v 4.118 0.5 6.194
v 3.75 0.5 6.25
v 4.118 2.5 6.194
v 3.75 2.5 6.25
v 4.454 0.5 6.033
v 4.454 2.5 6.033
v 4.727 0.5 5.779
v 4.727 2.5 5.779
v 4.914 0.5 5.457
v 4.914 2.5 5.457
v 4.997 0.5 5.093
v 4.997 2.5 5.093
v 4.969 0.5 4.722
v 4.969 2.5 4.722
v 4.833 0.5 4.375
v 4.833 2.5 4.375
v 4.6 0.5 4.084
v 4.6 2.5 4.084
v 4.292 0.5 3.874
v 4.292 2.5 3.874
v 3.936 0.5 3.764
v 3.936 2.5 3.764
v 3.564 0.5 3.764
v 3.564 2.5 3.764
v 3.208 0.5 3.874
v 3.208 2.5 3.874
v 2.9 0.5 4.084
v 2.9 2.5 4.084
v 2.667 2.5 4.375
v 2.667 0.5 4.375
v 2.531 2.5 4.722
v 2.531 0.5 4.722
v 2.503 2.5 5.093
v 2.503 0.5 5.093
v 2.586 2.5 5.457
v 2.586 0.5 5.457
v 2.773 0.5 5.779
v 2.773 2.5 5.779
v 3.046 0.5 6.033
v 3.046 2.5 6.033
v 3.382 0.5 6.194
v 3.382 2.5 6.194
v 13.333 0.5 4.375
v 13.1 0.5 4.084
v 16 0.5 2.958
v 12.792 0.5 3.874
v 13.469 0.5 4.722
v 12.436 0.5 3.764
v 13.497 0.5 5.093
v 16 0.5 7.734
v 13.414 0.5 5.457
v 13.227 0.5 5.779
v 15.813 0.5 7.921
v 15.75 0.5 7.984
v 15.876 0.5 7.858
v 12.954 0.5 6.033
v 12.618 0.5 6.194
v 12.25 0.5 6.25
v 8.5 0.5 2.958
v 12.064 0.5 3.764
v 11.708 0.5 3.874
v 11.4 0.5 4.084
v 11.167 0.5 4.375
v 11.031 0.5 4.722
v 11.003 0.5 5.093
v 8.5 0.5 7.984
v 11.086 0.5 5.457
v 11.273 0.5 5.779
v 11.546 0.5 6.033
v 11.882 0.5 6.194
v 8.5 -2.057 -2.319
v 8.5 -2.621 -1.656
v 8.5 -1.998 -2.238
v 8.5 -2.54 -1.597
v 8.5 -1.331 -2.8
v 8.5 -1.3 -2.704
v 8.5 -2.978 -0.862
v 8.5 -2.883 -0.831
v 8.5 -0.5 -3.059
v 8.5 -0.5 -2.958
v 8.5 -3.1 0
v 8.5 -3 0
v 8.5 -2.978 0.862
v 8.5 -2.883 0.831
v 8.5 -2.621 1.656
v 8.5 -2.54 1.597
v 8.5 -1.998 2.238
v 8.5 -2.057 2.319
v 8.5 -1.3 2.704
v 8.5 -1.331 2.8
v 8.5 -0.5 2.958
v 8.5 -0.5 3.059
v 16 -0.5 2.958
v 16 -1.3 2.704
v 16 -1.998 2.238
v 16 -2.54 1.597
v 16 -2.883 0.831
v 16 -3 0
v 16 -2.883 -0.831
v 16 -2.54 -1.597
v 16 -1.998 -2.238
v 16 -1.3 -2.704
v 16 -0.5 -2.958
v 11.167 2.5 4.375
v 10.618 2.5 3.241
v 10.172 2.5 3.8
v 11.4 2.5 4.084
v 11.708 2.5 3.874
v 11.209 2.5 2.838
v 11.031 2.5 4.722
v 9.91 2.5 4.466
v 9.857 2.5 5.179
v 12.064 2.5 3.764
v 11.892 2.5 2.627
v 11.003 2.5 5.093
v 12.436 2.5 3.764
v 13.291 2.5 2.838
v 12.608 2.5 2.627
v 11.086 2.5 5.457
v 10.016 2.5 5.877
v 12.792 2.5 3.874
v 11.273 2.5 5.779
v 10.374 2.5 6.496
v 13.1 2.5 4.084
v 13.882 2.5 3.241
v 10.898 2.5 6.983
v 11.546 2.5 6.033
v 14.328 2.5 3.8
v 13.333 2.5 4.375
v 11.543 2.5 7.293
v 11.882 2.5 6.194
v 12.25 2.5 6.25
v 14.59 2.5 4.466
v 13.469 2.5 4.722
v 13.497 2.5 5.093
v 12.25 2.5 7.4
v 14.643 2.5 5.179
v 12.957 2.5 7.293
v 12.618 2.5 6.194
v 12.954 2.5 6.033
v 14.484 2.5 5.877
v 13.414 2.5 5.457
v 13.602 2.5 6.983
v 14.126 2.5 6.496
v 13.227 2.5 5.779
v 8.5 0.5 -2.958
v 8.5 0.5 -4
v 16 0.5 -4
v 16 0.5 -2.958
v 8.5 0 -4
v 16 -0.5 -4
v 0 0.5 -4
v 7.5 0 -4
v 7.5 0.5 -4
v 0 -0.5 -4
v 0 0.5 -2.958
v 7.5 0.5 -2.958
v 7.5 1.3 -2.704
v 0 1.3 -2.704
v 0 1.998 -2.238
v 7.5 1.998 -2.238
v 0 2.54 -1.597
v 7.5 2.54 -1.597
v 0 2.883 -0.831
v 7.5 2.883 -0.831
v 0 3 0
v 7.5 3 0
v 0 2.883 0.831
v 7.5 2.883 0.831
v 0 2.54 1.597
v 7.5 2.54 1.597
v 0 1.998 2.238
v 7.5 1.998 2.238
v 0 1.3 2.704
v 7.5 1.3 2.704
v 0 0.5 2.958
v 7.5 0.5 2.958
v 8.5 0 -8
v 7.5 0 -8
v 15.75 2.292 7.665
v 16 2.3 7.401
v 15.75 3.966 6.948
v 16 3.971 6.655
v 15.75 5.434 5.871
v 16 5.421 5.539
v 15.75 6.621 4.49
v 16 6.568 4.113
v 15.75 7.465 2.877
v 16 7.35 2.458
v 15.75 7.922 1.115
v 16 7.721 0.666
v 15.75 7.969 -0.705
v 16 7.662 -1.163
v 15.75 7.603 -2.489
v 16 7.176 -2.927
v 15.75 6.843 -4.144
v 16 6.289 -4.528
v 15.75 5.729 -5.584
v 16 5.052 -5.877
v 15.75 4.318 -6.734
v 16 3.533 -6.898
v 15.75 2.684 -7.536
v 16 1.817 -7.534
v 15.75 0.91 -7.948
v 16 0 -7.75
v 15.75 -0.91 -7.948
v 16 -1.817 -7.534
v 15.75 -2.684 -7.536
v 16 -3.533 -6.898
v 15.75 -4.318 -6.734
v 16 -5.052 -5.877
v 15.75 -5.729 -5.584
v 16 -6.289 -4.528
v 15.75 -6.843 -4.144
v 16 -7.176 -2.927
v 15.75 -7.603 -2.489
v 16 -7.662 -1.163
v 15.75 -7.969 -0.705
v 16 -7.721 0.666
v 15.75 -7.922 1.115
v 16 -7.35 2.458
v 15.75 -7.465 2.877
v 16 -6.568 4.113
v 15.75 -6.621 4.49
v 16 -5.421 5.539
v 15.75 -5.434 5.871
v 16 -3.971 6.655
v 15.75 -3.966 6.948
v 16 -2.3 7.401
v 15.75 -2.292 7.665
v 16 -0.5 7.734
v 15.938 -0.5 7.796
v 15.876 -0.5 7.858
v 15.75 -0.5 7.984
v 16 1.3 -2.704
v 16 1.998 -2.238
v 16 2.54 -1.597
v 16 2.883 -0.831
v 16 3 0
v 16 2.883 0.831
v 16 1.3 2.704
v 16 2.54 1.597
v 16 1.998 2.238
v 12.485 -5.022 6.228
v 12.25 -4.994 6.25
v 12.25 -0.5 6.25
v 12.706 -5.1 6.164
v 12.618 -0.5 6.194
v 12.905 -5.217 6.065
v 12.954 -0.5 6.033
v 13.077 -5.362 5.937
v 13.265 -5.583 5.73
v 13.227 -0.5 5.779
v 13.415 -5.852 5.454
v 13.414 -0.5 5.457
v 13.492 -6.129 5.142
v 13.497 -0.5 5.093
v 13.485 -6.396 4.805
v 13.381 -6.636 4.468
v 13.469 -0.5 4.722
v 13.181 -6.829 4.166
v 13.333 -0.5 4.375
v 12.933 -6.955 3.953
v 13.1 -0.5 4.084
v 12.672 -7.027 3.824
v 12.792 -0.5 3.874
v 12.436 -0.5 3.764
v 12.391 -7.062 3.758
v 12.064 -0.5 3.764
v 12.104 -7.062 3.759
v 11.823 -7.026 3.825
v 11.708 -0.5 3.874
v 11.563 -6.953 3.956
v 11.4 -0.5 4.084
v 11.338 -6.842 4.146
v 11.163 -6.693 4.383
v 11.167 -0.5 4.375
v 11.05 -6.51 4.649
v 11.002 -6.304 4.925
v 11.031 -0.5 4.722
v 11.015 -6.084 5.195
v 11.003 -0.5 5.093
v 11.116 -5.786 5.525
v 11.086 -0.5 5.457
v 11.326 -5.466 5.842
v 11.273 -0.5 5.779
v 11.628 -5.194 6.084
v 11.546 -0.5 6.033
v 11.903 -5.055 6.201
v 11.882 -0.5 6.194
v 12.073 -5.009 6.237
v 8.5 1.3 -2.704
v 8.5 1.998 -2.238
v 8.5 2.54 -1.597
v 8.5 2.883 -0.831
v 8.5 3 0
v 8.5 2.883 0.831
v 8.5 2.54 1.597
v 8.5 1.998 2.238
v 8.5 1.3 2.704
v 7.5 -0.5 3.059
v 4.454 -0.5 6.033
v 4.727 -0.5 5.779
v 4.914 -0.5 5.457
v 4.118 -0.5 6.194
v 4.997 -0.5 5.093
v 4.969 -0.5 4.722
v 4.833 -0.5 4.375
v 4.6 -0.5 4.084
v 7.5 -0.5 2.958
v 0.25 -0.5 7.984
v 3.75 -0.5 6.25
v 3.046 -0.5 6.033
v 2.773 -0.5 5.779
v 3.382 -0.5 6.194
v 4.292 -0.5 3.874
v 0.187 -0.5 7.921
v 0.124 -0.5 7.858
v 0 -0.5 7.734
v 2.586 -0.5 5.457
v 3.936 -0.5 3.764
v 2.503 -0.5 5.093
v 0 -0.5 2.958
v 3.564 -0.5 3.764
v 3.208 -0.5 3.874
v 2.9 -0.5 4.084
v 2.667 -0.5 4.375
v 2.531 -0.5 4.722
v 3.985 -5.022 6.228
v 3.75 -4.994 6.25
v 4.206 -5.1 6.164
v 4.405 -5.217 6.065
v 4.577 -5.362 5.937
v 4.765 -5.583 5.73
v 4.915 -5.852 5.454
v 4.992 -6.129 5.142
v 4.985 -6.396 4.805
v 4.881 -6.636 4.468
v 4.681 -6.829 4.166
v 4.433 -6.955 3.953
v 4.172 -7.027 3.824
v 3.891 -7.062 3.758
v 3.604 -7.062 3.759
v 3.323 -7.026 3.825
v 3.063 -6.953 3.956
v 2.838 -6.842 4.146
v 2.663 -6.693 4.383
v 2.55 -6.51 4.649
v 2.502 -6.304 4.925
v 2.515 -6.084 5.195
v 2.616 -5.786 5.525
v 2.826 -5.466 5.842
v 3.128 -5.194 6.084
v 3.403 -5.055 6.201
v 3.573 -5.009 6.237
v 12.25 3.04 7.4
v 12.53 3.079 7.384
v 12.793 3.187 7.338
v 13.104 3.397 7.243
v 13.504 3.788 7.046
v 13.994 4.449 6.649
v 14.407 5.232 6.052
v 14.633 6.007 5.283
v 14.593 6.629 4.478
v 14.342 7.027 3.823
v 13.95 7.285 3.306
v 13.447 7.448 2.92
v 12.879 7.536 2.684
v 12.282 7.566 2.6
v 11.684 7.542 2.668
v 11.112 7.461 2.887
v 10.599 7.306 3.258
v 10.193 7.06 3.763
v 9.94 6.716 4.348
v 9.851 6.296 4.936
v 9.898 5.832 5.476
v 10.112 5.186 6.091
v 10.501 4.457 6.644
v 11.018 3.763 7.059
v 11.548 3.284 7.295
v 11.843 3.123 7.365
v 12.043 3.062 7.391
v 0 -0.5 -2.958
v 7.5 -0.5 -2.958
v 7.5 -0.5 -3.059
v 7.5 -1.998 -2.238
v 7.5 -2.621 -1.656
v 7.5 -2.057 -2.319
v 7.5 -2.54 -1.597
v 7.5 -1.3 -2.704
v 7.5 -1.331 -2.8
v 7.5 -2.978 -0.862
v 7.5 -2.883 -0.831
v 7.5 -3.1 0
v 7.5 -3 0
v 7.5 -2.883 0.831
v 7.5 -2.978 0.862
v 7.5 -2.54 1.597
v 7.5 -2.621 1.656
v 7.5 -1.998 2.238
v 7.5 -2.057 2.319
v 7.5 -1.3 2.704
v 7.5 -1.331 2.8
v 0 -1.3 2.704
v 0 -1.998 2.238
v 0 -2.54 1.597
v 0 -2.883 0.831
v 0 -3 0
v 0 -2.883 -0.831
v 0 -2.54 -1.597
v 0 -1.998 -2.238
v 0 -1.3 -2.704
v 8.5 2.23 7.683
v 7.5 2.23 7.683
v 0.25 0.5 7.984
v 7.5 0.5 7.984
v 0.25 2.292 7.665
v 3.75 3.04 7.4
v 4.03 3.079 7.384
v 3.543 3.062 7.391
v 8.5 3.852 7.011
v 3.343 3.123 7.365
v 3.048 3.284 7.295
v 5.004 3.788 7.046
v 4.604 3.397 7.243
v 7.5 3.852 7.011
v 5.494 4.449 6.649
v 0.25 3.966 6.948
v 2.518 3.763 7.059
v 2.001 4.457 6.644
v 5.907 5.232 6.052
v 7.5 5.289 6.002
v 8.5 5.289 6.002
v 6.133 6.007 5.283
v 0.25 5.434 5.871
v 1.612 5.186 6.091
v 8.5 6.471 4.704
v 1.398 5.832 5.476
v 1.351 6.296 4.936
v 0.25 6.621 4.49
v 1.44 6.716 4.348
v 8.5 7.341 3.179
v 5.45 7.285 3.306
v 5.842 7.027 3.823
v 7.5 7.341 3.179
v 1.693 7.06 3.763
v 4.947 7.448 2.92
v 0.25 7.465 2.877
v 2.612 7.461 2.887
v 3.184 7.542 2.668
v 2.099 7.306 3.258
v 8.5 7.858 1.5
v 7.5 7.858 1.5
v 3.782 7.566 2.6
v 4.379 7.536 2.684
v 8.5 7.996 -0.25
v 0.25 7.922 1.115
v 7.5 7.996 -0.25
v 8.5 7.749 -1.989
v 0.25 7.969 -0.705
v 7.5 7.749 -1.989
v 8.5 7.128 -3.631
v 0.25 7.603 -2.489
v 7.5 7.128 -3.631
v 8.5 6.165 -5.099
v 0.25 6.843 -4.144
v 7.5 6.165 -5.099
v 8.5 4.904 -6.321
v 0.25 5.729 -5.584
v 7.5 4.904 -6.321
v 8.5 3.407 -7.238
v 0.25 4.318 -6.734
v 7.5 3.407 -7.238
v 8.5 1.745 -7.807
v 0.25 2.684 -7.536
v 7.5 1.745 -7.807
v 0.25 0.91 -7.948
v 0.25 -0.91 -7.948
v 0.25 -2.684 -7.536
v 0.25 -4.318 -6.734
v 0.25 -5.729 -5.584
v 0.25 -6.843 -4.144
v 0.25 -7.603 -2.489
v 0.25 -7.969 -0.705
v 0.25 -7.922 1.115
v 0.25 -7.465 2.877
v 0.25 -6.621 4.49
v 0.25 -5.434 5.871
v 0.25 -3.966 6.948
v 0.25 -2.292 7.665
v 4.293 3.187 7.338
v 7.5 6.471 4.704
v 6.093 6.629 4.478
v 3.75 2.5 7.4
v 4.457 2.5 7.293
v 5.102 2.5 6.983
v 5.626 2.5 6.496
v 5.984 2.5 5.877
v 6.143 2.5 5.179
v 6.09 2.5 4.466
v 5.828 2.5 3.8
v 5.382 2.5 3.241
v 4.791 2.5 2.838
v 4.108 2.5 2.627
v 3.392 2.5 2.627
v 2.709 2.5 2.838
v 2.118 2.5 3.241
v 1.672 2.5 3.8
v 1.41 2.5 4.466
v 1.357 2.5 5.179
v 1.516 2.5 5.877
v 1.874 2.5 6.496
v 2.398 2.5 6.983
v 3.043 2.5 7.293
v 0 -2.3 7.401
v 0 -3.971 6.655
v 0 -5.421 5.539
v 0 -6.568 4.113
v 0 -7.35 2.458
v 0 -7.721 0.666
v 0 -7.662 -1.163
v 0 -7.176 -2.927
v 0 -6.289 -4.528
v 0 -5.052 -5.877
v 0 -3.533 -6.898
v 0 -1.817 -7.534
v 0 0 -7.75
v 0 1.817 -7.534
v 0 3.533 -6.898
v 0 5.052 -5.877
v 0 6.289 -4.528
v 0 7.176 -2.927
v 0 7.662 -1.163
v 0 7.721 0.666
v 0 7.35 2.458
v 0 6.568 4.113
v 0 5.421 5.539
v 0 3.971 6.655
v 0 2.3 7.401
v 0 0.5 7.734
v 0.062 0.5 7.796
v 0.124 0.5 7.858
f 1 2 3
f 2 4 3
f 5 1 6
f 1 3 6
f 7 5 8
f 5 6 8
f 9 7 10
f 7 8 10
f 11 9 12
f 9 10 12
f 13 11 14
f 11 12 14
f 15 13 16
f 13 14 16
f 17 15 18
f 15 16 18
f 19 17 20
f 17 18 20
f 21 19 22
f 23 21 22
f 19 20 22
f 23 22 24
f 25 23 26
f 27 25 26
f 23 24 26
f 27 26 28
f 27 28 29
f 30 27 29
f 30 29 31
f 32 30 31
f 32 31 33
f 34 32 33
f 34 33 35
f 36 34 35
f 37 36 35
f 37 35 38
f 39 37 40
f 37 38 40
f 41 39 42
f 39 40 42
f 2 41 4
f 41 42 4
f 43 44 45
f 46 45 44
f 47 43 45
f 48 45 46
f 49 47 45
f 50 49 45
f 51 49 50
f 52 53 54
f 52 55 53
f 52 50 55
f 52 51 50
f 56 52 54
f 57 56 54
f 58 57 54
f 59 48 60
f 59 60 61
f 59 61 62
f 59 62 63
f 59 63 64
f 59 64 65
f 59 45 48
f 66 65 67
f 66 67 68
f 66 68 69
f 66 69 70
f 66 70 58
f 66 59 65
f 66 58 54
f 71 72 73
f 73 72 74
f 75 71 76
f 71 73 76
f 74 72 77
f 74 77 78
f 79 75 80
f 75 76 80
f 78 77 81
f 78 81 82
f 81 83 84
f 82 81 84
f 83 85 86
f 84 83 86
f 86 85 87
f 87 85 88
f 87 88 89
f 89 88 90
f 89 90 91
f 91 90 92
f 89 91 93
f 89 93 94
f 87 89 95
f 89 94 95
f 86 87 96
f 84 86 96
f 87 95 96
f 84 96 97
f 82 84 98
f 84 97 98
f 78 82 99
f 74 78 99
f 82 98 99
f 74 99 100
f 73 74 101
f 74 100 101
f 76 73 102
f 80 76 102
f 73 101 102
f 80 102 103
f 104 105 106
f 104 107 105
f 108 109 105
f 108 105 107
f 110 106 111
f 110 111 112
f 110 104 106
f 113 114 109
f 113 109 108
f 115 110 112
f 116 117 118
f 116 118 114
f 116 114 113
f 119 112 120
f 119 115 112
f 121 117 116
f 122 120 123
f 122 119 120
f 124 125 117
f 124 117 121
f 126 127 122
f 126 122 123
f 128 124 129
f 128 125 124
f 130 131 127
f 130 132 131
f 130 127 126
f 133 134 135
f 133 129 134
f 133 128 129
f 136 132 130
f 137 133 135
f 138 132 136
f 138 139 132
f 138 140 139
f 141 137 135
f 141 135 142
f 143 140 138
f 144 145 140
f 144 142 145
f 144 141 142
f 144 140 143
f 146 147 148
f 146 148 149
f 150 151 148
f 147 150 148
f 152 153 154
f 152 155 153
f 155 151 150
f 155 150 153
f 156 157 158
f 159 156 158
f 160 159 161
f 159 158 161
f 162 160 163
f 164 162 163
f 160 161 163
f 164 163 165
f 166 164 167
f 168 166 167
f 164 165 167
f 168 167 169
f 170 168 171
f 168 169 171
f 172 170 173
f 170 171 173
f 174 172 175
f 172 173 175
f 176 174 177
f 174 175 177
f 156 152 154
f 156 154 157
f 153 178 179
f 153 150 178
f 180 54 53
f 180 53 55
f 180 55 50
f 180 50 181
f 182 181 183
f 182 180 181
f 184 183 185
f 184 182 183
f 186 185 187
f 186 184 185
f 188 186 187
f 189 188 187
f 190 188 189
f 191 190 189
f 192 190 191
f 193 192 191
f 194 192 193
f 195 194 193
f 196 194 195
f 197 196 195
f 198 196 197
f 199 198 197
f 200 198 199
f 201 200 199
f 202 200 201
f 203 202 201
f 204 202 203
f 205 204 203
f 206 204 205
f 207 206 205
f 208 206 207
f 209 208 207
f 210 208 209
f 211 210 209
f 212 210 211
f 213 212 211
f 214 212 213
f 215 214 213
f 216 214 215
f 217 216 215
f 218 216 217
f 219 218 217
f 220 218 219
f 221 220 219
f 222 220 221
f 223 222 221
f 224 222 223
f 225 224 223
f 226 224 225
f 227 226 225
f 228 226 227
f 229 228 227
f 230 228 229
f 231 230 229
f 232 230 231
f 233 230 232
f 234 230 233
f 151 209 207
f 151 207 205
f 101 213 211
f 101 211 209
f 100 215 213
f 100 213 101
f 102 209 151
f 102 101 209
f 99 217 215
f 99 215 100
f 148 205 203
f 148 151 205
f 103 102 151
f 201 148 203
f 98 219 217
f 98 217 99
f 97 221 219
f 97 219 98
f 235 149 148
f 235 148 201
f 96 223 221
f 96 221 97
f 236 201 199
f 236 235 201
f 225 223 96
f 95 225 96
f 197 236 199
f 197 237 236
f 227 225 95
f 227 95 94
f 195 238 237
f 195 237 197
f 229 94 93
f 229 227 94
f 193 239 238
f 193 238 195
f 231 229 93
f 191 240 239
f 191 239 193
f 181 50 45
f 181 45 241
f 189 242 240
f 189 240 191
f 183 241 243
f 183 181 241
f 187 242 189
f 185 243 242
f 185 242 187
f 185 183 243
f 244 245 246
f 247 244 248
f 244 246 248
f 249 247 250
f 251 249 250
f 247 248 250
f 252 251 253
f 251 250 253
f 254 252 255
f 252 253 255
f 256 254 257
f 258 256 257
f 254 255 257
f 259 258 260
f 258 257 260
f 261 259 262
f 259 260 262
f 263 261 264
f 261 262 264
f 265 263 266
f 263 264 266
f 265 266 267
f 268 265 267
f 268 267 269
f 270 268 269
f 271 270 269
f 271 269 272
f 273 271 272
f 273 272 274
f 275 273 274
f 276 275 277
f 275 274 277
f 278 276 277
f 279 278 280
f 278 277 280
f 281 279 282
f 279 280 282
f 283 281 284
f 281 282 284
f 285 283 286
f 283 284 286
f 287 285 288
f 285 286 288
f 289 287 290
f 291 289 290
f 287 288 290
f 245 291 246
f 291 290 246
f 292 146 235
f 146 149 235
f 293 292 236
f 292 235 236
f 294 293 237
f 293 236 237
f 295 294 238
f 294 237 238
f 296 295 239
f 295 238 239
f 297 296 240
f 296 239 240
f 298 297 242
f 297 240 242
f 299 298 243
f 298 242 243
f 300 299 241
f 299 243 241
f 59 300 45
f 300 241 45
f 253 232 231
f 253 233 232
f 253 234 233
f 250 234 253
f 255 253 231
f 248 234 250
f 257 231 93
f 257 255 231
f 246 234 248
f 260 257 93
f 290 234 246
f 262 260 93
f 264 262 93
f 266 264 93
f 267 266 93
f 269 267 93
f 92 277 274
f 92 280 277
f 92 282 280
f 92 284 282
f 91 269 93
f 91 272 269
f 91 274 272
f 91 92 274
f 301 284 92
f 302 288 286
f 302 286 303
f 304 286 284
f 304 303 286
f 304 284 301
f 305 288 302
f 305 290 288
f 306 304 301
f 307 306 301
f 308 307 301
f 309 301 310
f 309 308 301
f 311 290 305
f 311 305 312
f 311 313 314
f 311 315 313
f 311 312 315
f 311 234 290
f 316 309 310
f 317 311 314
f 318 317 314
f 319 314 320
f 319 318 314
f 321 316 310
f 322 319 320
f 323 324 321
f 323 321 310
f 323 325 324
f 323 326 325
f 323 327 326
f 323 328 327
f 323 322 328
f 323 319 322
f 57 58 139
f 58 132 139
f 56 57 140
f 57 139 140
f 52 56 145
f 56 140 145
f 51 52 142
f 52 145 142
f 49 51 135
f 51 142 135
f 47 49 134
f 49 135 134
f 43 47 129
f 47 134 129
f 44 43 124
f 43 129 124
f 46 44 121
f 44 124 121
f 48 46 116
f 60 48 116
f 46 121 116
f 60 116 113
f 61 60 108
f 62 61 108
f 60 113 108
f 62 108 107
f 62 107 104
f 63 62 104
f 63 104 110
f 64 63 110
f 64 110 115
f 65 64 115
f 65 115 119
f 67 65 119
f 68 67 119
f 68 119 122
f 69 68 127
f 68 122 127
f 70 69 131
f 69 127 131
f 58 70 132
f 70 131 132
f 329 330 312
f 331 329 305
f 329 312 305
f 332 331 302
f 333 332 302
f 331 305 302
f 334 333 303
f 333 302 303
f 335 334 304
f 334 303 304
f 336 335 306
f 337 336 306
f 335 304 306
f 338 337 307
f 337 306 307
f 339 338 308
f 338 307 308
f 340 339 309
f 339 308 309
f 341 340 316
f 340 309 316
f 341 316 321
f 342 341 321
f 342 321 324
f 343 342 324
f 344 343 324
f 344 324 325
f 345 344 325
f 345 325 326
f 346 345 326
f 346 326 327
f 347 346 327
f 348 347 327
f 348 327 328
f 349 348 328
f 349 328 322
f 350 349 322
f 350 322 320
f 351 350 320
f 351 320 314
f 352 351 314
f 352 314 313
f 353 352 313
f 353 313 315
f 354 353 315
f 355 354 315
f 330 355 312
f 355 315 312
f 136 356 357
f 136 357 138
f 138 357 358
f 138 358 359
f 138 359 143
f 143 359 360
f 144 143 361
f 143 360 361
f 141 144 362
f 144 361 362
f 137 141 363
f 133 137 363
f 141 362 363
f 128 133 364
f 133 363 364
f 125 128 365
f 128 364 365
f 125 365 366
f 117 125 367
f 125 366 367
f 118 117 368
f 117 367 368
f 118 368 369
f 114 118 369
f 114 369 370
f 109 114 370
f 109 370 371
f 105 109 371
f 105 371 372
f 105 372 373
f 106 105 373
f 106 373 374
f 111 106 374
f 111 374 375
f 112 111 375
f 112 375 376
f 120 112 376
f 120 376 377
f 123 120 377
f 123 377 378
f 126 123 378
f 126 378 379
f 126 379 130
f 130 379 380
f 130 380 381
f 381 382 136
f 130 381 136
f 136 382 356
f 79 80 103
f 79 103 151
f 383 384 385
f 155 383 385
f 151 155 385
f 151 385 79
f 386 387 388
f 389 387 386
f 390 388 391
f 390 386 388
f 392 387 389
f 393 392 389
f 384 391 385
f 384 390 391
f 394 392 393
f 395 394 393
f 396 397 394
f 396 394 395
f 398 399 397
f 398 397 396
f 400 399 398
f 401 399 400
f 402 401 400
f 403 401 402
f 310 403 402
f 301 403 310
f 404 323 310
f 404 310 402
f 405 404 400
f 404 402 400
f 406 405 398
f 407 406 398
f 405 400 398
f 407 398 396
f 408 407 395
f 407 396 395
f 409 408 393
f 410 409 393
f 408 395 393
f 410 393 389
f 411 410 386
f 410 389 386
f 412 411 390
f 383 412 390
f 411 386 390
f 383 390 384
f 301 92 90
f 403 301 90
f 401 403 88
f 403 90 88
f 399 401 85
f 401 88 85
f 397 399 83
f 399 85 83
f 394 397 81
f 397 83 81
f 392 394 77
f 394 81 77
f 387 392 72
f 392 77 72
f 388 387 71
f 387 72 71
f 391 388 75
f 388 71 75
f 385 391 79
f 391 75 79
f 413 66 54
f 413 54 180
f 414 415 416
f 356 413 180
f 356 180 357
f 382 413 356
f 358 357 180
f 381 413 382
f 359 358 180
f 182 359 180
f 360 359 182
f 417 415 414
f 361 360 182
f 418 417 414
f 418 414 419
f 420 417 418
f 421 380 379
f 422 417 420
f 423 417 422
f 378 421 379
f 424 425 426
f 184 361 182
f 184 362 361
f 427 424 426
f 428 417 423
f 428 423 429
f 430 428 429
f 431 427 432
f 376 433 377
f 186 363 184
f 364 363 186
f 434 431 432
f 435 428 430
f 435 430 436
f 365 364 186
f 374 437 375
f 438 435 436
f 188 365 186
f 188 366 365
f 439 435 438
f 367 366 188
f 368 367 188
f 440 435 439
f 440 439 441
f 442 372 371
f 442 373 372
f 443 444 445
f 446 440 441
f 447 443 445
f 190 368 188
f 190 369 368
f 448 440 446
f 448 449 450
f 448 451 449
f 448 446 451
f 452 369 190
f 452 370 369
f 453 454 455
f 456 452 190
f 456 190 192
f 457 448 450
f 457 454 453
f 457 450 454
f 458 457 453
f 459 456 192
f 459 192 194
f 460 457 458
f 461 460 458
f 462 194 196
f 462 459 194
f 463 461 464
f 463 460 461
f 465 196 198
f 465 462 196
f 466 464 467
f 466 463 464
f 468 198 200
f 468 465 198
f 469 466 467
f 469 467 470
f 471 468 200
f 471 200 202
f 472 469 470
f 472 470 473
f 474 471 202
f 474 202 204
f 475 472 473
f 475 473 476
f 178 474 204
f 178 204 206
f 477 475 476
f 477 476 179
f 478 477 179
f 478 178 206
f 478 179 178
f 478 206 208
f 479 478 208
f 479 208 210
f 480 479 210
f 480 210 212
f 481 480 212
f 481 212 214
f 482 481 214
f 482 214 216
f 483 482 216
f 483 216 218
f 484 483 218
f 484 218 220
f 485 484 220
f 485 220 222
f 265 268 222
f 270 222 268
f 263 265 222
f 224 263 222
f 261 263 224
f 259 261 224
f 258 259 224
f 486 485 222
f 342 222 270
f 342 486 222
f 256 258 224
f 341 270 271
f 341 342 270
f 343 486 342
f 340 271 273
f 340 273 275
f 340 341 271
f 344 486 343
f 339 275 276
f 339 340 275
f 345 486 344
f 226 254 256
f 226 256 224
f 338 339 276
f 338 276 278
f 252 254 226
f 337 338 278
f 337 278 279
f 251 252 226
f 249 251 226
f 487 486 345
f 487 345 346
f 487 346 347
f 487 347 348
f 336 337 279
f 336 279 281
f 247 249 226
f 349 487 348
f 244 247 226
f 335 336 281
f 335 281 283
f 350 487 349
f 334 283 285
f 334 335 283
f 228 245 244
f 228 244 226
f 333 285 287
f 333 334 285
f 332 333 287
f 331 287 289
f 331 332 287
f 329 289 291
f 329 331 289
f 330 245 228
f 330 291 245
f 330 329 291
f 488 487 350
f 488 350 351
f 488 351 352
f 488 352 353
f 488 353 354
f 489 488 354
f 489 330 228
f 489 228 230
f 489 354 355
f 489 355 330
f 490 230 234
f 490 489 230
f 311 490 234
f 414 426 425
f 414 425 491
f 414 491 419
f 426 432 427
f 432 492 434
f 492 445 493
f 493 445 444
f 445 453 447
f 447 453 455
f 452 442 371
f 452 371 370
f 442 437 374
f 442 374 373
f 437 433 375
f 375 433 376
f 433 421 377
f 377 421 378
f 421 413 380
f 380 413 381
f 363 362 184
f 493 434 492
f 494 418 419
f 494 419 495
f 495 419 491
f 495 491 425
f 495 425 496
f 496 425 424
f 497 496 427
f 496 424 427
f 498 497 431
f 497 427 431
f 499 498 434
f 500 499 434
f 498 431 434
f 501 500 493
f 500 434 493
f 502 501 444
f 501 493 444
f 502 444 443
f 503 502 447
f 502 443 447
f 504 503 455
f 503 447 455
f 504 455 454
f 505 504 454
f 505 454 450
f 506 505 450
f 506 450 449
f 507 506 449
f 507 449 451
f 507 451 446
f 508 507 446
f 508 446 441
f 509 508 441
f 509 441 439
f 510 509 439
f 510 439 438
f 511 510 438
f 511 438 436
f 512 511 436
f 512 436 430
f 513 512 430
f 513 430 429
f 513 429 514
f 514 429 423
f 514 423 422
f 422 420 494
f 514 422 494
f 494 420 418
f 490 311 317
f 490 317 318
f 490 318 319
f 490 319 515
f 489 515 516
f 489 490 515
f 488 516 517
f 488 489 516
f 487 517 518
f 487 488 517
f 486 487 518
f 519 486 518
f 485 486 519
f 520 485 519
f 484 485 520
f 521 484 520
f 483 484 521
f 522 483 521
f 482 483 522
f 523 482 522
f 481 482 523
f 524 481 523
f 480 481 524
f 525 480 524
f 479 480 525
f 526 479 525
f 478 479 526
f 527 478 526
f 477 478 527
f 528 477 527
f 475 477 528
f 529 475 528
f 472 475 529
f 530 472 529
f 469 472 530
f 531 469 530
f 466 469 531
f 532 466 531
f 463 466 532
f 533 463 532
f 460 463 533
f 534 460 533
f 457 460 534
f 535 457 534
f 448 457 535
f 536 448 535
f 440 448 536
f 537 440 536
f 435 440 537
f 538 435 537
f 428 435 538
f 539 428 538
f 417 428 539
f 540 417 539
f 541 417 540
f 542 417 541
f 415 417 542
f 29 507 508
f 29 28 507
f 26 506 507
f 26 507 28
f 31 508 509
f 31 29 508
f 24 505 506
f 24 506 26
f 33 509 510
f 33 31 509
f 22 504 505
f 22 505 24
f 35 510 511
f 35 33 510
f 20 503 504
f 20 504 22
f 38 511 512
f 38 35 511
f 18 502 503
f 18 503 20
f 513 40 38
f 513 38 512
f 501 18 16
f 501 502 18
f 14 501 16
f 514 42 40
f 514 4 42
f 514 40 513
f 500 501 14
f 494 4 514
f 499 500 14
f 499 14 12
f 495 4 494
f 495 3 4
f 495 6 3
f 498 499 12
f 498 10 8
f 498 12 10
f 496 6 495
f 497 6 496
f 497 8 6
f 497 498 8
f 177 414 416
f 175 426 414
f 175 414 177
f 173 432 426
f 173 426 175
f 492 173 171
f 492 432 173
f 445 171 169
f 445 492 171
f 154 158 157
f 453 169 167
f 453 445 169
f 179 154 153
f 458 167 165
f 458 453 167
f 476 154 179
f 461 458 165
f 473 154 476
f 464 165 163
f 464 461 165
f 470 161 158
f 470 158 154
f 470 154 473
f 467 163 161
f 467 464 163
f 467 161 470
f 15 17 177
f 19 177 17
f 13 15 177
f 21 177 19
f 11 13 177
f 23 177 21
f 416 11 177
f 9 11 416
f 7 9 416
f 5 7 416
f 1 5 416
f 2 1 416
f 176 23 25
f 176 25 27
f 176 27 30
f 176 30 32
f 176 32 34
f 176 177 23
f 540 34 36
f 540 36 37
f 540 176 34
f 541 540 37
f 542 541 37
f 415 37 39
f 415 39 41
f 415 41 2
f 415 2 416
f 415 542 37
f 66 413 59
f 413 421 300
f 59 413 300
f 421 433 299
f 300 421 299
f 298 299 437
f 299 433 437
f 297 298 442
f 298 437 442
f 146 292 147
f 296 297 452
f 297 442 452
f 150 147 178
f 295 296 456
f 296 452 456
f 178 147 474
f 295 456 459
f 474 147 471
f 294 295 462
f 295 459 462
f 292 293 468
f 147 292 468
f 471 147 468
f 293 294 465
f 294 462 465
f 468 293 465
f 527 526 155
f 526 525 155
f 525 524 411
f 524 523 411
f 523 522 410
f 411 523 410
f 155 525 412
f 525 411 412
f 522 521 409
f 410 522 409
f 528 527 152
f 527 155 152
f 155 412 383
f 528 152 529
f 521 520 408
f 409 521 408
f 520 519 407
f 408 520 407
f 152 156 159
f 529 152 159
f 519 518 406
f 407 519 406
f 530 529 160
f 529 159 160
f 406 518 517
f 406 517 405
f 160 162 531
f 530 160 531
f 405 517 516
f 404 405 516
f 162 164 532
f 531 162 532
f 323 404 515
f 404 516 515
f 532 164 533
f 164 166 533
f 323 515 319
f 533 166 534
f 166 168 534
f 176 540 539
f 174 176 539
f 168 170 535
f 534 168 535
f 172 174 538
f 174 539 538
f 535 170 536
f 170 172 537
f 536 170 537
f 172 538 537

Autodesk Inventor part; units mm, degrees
sketch "Sketch_1" plane through (0, 0, 0) normal (0, 0, 1) x (1, 0, 0)
  line L0 (16, 0) -> (0, 0)
  line L1 (0, 3) -> (7.5, 3)
  line L2 (7.5, 3) -> (7.5, 3.1)
  line L3 (7.5, 3.1) -> (8.5, 3.1)
  line L4 (8.5, 3.1) -> (8.5, 3)
  line L5 (8.5, 3) -> (16, 3)
  line L6 (16, 3) -> (16, 7.75)
  line L7 (16, 7.75) -> (15.75, 8)
  line L8 (15.75, 8) -> (0.25, 8)
  line L9 (0.25, 8) -> (0, 7.75)
  line L10 (0, 7.75) -> (0, 3)
revolve "Revolution1" add sketch "Sketch_1" angle 360 about axis through (16, 0, 0) along (1, 0, 0)
sketch "Sketch_2" plane through (0, 0, 0) normal (1, 0, 0) x (0, 1, 0)
  line L0 (0.5, 8) -> (-0.5, 8)
  line L1 (-0.5, 8) -> (-0.5, -4)
  line L2 (-0.5, -4) -> (0.5, -4)
  line L3 (0.5, -4) -> (0.5, 8)
extrude "Extrusion1" cut sketch "Sketch_2" along normal blind 16
sketch "Sketch_3" plane through (0, 0, 0) normal (0, 1, 0) x (-1, 0, 0)
  line L0 (-8.5, 0) -> (-7.5, 0)
  line L1 (-7.5, 0) -> (-7.5, -8)
  line L2 (-7.5, -8) -> (-8.5, -8)
  line L3 (-8.5, -8) -> (-8.5, 0)
  line L4 (-8.5, 0) -> (-7.5, 0)
revolve "Revolution2" cut sketch "Sketch_3" angle 180 about axis through (8.5, 0, 0) along (1, 0, 0)
sketch "Sketch_4" plane through (3.75, 0, 0) normal (1, 0, 0) x (0, 0, -1)
  line L0 (-5, 8) -> (-5, -8)
  line L1 (-5, -8) -> (-6.25, -8)
  line L2 (-6.25, -8) -> (-6.25, 2.5)
  line L3 (-6.25, 2.5) -> (-7.4, 2.5)
  line L4 (-7.4, 2.5) -> (-7.4, 8)
  line L5 (-7.4, 8) -> (-5, 8)
  line L6 (-5, 8) -> (-5, -8)
revolve "Revolution3" cut sketch "Sketch_4" angle 360 about axis through (3.75, 8, 5) along (0, 1, 0)
sketch "Sketch_5" plane through (12.25, 0, 0) normal (1, 0, 0) x (0, 0, -1)
  line L0 (-5, 8) -> (-5, -8)
  line L1 (-5, -8) -> (-6.25, -8)
  line L2 (-6.25, -8) -> (-6.25, 2.5)
  line L3 (-6.25, 2.5) -> (-7.4, 2.5)
  line L4 (-7.4, 2.5) -> (-7.4, 8)
  line L5 (-7.4, 8) -> (-5, 8)
  line L6 (-5, 8) -> (-5, -8)
revolve "Revolution4" cut sketch "Sketch_5" angle 360 about axis through (12.25, 8, 5) along (0, 1, 0)
ref_plane "L_XY" through (3.75, 2.5, 5) normal (0, 1, 0) x (1, 0, 0)
ref_plane "L_YZ" through (3.75, 2.5, 5) normal (1, 0, 0) x (0, 0, -1)
ref_plane "L_ZX" through (3.75, 2.5, 5) normal (0, 0, -1) x (0, 1, 0)
ref_plane "R_XY" through (12.25, 2.5, 5) normal (0, 1, 0) x (1, 0, 0)
ref_plane "R_YZ" through (12.25, 2.5, 5) normal (1, 0, 0) x (0, 0, -1)
ref_plane "R_ZX" through (12.25, 2.5, 5) normal (0, 0, -1) x (0, 1, 0)
properties part number "D_CPRC16-6-6" material "鋼、炭素鋼"
